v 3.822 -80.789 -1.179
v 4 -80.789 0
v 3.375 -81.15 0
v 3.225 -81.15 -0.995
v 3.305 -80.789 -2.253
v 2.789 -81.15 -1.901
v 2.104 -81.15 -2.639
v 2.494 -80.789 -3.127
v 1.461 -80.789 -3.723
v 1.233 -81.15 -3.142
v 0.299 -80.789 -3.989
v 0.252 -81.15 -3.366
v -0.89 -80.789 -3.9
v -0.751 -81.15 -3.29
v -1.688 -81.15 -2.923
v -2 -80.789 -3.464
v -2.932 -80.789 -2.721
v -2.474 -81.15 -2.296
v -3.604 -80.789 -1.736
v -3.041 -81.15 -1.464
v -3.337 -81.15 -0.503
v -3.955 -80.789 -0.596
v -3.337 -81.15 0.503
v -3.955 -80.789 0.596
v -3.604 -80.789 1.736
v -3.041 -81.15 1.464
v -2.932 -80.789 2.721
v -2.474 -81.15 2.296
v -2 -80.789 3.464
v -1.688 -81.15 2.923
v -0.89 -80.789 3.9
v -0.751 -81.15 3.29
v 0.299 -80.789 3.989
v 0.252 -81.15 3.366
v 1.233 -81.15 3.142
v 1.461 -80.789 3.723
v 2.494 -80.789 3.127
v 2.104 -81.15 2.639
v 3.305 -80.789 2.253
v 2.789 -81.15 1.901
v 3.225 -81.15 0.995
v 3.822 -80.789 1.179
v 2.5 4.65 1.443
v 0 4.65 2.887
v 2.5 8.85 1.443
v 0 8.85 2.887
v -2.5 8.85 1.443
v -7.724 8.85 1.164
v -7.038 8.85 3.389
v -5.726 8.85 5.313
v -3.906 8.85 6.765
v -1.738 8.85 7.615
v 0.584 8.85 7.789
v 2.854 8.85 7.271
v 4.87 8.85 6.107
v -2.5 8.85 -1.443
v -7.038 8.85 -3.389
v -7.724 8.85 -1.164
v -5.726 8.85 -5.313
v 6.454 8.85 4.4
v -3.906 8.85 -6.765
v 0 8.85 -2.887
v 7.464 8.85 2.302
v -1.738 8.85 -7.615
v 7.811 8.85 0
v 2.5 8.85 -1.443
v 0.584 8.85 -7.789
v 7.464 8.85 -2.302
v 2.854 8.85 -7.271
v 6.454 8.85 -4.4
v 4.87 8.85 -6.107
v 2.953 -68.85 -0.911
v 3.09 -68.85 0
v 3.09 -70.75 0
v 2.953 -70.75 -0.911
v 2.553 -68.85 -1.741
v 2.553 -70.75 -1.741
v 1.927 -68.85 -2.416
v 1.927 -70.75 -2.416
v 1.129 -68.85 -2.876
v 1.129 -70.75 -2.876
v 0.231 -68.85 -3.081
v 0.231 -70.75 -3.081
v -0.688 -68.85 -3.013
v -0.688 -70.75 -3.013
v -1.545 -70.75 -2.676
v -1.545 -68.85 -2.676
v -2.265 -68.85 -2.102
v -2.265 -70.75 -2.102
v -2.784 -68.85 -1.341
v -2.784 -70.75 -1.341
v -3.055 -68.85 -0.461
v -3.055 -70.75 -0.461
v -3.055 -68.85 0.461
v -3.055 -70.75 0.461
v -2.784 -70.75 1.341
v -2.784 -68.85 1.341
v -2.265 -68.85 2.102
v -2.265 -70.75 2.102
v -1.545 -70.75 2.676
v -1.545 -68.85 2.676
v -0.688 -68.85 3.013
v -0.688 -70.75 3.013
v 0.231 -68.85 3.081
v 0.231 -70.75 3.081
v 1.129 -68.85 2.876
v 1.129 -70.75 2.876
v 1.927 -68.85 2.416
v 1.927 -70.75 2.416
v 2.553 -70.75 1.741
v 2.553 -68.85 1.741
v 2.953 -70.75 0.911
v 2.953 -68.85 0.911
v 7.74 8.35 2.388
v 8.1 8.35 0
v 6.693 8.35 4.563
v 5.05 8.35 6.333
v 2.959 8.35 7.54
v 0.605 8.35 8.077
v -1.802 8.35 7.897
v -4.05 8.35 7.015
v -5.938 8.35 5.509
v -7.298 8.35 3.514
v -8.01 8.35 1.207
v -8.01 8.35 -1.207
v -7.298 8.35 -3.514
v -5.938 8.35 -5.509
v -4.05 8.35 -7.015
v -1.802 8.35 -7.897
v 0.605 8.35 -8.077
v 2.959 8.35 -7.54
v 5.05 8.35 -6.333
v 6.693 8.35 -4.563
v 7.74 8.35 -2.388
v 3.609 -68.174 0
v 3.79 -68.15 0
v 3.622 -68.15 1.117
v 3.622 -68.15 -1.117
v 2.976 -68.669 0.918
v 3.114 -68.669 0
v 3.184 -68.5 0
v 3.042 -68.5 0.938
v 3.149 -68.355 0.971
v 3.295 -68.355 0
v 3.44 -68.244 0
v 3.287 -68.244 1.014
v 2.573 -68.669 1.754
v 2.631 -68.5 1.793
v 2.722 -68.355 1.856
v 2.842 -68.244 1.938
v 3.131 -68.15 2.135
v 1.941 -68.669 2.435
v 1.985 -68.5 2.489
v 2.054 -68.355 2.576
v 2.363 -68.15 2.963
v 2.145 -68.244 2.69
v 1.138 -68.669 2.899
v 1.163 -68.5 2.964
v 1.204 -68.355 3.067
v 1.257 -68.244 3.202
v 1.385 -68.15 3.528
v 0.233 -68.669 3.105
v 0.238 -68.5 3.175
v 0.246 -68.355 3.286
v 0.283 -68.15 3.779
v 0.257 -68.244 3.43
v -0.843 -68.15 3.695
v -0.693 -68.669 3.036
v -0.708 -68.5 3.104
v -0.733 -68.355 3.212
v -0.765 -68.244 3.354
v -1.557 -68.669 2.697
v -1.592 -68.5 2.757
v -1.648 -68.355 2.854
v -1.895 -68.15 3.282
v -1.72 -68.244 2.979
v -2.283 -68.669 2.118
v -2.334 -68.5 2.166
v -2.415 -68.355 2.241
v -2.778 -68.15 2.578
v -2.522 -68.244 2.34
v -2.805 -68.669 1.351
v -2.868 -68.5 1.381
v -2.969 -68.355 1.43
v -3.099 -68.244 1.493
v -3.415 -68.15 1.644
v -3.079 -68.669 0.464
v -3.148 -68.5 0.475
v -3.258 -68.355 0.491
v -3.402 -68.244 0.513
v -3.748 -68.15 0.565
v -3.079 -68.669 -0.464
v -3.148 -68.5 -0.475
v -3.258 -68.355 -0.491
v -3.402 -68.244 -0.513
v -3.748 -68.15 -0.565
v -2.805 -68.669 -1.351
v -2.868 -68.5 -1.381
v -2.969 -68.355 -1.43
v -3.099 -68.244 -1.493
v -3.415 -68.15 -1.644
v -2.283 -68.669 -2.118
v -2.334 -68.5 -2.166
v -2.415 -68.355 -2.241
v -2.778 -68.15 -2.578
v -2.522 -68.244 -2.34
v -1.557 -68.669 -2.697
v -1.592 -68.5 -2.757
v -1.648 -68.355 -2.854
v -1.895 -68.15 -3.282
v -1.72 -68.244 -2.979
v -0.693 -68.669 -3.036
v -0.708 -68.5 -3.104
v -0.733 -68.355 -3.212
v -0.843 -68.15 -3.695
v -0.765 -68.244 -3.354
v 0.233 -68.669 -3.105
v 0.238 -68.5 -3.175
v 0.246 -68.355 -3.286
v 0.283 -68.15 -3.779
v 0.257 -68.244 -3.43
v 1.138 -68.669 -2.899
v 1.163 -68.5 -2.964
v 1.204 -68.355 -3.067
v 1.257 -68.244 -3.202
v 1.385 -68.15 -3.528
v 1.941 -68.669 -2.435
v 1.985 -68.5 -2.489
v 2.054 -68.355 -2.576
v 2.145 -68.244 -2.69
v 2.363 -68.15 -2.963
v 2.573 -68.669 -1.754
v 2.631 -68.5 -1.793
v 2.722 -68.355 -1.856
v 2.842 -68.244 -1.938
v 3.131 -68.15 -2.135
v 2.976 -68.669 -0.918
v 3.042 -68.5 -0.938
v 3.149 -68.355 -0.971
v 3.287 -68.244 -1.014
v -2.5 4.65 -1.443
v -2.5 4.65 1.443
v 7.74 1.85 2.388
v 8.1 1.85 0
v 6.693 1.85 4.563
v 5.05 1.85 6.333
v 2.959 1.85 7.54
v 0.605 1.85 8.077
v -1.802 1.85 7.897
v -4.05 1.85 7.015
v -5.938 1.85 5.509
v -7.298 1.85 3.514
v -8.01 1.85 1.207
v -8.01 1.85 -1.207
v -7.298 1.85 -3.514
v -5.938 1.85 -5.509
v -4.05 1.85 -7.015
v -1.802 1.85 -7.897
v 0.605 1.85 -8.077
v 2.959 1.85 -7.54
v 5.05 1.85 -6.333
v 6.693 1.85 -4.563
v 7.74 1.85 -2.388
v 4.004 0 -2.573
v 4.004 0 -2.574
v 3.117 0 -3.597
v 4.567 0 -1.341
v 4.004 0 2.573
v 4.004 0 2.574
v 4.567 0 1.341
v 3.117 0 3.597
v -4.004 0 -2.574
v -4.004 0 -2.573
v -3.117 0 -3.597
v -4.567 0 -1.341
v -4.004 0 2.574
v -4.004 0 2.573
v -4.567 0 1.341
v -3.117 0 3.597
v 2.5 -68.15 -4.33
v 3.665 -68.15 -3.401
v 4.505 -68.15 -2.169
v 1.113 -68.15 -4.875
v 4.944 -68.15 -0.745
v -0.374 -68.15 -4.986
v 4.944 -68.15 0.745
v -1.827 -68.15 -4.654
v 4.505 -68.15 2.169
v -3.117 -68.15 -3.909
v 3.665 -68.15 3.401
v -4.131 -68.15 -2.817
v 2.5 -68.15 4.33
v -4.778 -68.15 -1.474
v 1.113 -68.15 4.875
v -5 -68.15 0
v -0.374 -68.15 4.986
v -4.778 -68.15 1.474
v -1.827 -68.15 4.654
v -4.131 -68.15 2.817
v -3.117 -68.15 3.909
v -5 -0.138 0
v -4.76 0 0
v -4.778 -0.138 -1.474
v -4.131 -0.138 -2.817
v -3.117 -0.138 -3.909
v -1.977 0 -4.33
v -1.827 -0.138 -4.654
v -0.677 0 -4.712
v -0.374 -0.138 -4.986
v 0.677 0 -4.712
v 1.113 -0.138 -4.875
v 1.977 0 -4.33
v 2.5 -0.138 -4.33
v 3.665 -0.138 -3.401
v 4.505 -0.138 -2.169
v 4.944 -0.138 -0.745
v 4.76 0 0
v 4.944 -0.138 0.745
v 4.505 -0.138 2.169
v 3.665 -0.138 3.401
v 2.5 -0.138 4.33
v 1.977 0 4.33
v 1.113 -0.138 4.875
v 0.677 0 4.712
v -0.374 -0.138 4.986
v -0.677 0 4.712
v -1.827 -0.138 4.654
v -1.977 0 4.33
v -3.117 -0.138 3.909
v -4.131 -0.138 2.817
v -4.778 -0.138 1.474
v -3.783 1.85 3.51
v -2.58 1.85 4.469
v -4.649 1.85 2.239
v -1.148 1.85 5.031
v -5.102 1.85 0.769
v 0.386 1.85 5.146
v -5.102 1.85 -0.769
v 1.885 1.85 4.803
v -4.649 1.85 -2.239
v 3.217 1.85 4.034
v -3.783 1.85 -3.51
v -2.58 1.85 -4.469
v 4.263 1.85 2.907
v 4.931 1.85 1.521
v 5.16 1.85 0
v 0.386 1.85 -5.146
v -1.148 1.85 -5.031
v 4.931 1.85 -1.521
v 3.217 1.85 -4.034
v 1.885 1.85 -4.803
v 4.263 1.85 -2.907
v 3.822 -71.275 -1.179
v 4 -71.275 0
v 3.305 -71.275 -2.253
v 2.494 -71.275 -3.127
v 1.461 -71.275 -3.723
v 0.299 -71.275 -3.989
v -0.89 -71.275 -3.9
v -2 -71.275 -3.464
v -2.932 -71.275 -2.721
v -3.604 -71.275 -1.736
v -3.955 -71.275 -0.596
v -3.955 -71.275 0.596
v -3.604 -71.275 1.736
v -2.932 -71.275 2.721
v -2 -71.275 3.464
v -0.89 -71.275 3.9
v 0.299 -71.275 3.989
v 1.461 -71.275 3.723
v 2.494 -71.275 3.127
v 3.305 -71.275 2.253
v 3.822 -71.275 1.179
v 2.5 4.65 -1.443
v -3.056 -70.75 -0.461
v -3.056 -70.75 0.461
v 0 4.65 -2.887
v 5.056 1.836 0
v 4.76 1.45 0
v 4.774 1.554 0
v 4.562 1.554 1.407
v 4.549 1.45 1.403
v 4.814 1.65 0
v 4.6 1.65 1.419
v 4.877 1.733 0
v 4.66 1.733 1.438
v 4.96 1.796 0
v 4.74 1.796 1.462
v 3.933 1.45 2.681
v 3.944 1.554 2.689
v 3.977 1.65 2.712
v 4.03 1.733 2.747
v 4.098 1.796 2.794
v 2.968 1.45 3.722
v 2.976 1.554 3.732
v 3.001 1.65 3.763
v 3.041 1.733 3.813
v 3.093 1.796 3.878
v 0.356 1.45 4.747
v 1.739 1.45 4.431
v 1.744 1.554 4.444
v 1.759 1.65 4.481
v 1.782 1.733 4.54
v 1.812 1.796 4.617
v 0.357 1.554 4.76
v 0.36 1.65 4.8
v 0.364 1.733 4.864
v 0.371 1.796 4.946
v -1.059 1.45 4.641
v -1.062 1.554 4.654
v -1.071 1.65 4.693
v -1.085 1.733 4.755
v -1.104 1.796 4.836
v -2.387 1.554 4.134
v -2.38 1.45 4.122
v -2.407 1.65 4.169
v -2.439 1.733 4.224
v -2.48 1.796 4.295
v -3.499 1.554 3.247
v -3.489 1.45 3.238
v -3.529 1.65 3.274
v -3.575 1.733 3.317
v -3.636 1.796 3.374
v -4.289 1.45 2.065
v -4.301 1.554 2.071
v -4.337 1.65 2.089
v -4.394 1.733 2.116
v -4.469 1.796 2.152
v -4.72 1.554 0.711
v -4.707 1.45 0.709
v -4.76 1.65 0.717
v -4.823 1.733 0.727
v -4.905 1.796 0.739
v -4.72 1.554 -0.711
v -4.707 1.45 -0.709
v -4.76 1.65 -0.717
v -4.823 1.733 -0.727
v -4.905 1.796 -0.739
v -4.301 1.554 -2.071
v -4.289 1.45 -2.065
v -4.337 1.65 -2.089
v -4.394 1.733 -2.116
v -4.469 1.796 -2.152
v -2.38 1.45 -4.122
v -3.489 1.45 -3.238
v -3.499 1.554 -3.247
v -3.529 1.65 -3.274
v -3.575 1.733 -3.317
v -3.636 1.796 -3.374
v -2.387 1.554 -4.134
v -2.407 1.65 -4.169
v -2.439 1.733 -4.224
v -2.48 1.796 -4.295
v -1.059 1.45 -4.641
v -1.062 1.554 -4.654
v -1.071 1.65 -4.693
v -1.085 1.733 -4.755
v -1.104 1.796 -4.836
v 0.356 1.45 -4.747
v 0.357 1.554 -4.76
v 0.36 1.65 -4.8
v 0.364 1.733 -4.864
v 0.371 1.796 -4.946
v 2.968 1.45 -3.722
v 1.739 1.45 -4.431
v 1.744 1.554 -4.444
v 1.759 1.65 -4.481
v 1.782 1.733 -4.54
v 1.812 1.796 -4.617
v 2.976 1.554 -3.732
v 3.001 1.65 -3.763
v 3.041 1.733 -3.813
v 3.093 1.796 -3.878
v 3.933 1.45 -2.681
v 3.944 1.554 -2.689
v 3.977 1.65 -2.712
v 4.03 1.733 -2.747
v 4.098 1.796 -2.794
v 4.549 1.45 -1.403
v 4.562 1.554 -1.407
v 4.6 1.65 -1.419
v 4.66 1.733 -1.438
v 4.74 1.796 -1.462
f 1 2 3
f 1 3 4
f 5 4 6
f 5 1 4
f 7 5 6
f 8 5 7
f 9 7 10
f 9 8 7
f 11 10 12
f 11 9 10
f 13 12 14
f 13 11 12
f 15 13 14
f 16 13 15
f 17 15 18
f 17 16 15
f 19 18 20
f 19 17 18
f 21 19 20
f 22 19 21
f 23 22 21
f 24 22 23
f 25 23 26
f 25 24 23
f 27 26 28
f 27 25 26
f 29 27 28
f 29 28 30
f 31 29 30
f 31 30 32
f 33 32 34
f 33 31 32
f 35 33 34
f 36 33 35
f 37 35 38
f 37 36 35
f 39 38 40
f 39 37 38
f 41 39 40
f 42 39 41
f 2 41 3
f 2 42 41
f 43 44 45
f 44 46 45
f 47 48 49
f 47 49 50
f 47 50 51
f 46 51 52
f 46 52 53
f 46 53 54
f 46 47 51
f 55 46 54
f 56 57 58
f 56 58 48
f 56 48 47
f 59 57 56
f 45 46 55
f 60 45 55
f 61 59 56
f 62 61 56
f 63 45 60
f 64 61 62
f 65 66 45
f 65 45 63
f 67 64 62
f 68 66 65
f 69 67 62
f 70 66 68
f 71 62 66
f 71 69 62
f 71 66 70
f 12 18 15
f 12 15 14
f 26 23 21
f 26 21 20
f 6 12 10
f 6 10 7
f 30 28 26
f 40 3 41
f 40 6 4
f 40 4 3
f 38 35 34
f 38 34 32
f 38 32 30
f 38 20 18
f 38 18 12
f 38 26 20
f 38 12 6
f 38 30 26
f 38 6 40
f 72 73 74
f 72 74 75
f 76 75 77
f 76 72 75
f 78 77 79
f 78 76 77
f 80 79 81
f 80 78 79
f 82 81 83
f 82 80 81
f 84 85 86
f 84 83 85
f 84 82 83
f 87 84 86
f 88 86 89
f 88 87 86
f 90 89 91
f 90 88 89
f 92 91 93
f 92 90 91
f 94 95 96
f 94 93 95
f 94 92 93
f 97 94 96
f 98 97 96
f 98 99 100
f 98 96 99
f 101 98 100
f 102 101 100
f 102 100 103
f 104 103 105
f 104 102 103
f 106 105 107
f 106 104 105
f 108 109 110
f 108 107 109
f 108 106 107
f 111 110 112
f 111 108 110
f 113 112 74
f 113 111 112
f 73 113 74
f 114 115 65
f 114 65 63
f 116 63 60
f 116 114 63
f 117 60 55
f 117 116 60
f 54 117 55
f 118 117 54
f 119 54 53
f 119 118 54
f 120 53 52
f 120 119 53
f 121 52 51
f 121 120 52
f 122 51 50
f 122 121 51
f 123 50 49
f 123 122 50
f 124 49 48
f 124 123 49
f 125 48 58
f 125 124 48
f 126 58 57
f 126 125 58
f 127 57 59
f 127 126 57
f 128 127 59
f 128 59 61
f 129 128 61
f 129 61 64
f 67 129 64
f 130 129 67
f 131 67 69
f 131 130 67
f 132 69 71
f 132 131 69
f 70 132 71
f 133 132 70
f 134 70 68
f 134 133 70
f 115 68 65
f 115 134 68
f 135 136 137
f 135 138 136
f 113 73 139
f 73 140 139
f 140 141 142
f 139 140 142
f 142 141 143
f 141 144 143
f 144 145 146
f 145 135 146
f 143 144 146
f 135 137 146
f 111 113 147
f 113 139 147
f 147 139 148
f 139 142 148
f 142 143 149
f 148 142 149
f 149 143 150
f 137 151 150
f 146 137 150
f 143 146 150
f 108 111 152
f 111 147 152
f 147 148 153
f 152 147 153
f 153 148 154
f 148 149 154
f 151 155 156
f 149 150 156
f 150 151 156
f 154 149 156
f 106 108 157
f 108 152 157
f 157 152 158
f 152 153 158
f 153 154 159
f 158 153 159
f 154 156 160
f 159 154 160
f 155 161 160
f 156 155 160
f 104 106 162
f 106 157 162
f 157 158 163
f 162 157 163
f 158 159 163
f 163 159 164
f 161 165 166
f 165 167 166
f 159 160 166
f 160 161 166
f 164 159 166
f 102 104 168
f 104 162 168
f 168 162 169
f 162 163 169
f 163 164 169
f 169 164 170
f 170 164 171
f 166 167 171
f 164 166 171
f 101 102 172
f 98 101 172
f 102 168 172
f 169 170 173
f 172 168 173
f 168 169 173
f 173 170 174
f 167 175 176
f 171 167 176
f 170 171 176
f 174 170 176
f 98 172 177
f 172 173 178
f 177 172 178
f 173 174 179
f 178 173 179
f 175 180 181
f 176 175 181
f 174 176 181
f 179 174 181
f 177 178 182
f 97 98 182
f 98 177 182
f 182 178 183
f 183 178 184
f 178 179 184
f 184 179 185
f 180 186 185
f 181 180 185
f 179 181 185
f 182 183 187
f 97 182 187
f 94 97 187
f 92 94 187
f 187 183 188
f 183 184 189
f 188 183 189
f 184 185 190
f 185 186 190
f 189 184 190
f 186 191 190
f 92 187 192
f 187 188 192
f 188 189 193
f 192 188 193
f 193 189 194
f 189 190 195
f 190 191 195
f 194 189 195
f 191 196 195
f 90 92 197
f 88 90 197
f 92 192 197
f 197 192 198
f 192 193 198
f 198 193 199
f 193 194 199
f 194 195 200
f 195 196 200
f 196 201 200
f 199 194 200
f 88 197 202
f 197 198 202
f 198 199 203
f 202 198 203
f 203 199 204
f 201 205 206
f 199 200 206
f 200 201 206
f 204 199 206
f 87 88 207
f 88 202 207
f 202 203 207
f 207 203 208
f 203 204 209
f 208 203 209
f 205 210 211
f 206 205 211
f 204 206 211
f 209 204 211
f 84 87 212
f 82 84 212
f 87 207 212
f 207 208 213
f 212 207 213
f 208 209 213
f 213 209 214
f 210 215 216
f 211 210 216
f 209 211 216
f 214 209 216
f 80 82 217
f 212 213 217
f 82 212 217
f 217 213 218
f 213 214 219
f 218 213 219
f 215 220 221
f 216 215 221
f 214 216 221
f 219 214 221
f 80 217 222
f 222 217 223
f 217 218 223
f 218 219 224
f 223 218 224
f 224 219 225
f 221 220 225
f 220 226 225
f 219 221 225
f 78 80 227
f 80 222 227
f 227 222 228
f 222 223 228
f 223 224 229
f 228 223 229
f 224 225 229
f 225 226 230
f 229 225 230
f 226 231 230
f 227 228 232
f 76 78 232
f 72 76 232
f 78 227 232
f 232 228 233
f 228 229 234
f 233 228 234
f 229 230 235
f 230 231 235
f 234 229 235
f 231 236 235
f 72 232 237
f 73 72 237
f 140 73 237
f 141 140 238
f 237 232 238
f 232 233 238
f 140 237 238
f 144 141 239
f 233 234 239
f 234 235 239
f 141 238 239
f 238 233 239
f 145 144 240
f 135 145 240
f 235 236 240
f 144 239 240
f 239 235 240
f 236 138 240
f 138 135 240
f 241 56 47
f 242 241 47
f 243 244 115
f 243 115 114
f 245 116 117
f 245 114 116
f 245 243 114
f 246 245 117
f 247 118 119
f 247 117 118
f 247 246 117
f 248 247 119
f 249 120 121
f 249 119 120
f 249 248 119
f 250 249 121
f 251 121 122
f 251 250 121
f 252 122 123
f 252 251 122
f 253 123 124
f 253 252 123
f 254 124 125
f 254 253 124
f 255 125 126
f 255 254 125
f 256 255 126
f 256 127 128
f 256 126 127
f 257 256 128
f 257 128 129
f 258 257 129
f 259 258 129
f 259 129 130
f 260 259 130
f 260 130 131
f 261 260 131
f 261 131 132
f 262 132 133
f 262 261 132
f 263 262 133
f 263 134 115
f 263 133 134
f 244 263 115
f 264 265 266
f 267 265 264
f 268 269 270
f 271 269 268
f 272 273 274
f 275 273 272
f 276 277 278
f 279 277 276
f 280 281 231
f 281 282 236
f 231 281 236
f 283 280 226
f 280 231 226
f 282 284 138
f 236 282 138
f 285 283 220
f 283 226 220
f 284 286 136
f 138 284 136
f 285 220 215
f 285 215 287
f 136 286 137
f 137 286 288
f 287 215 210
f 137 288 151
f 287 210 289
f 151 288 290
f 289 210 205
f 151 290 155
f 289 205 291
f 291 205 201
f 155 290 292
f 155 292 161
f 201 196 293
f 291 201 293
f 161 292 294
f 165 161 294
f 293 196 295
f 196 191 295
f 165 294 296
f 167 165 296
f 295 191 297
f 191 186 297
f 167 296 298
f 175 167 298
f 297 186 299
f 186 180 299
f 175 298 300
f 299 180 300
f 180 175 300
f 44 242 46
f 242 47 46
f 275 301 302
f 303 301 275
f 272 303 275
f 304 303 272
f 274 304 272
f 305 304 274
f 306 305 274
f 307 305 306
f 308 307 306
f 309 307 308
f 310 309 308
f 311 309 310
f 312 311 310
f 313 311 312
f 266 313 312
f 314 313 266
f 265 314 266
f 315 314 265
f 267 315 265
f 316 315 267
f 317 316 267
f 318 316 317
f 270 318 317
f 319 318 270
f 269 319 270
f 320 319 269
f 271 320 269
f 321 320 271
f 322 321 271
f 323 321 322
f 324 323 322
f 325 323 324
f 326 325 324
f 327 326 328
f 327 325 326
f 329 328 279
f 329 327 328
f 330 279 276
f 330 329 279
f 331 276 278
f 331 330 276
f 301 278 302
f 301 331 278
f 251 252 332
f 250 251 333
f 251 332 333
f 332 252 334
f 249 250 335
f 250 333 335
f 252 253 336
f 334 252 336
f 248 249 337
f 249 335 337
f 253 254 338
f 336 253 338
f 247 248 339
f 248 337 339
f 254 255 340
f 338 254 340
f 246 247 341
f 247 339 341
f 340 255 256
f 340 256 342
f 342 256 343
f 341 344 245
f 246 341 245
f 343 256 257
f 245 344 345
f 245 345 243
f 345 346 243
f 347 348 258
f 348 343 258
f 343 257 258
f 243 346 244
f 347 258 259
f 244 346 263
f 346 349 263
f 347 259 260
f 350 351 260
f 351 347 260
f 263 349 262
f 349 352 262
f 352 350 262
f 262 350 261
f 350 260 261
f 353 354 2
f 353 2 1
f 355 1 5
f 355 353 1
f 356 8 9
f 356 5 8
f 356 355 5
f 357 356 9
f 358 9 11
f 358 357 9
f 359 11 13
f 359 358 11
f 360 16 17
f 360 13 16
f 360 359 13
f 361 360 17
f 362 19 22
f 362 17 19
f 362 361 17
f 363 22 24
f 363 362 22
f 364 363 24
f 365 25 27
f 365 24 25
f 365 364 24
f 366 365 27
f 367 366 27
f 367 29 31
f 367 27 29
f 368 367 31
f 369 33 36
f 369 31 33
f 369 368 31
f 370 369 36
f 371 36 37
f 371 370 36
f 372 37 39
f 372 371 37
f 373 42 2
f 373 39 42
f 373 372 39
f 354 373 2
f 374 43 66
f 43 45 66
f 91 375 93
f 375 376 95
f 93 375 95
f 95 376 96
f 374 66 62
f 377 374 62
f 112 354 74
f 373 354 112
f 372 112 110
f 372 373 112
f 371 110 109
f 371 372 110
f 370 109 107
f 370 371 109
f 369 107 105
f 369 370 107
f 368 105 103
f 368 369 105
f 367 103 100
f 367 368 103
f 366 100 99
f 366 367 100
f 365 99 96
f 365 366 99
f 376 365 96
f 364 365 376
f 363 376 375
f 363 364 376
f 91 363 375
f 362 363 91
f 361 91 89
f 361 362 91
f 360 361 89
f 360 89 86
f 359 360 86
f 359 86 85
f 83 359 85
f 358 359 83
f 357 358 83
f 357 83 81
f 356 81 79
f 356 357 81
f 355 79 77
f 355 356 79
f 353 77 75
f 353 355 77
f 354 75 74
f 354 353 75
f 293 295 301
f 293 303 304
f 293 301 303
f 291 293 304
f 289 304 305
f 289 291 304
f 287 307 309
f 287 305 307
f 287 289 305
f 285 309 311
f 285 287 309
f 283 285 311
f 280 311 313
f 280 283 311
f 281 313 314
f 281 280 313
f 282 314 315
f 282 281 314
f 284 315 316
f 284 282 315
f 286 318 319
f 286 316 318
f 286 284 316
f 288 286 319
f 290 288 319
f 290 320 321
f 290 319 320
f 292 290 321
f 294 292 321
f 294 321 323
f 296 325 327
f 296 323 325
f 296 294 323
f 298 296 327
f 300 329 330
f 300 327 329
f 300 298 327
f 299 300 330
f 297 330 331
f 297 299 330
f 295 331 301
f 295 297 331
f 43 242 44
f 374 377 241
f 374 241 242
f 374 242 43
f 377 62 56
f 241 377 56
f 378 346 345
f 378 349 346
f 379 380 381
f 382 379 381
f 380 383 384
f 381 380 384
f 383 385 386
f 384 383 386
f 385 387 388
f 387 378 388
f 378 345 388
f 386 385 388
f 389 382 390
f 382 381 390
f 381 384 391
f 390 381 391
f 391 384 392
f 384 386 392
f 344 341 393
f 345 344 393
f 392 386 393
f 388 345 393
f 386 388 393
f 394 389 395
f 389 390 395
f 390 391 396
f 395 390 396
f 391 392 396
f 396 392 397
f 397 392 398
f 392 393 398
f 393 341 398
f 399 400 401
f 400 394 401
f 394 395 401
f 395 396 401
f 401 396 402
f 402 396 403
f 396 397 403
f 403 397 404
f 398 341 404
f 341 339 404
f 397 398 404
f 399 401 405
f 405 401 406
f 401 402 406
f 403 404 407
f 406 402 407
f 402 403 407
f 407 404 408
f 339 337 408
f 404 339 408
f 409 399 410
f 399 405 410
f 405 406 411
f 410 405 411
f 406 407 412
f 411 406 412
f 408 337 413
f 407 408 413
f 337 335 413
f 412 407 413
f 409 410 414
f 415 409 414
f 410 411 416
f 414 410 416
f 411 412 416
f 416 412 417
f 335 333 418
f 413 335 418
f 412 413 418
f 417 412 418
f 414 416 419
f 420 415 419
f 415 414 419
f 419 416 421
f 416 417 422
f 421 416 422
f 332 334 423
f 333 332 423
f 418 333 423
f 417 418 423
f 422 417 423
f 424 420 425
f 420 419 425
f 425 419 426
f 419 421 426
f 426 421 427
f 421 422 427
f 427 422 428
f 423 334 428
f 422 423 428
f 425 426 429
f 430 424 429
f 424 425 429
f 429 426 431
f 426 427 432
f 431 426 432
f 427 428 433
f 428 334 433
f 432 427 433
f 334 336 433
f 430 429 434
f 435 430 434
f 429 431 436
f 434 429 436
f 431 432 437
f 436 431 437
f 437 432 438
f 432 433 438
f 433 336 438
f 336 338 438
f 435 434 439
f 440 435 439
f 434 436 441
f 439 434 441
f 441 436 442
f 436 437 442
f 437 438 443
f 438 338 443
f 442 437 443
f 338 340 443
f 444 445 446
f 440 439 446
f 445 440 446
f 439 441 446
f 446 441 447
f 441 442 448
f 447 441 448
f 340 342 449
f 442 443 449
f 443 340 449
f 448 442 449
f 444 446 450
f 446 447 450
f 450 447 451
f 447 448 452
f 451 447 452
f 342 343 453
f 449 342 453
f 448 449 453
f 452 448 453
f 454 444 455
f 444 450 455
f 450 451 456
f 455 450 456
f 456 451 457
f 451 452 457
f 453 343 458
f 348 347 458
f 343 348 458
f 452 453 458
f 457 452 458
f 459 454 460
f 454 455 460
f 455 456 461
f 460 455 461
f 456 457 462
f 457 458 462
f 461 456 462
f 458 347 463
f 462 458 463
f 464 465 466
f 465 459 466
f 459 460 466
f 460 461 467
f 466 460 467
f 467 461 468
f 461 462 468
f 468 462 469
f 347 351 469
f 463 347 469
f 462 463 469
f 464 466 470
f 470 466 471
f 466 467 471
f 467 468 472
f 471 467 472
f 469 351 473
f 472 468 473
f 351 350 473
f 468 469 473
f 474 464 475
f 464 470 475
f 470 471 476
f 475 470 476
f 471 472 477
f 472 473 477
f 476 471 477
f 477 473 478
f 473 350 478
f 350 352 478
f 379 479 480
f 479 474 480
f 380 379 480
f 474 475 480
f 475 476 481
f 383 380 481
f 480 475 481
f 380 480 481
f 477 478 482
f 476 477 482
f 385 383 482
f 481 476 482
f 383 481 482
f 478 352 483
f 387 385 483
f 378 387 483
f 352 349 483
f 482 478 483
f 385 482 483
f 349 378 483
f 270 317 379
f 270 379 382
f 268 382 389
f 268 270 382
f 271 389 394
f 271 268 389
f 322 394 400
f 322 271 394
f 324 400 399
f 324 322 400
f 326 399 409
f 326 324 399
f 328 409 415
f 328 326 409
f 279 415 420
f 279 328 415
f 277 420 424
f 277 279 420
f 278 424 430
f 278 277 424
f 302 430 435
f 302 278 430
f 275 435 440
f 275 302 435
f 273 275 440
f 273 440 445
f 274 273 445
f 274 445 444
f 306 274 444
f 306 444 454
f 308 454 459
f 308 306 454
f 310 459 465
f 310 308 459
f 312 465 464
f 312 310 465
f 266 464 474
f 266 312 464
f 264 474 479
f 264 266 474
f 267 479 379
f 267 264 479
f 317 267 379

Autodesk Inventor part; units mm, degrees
ref_plane "YZ Plane" through (0, 0, 0) normal (1, 0, 0) x (0, 1, 0)
ref_plane "XZ Plane" through (0, 0, 0) normal (0, 1, 0) x (-1, 0, 0)
ref_plane "XY Plane" through (0, 0, 0) normal (0, 0, 1) x (1, 0, 0)
sketch "Sketch1" plane through (0, 0, 0) normal (0, 0, 1) x (1, 0, 0)
  line L0 (0, 0) -> (-5, 0)
  line L1 (-5, 0) -> (-5, -68.15)
  line L2 (-5, -68.15) -> (0, -68.15)
  line L3 (0, -68.15) -> (0, 0)
  line L4 (0, 13.63) -> (0, -81.78) projected
  line L5 (-6, 0) -> (1, 0) projected
  dimension "d1" = 68.15
  dimension "d2" = 5
revolve "Shoulder" add sketch "Sketch1" angle 360 about axis through (0, -68.15, 0) along (0, 1, 0)
sketch "Sketch2" plane through (0, 0, 0) normal (0, 1, 0) x (1, 0, 0)
  circle A0 centre (0, 0) radius 5 projected
  circle A1 centre (0, 0) radius 4.76
  dimension "d3" = 9.52
extrude "Shoulder_neck" add sketch "Sketch2" along normal blind 1.85 contours A1
sketch "Sketch3" plane through (0, 1.85, 0) normal (0, 1, 0) x (1, 0, 0)
  circle A0 centre (0, 0) radius 4.76 projected
  circle A1 centre (0, 0) radius 8.1
  dimension "d6" = 16.2
extrude "Head" add sketch "Sketch3" along normal blind 7 contours A0 | A1
sketch "Sketch4" plane through (0, -68.15, 0) normal (0, -1, 0) x (1, 0, 0)
  circle A0 centre (0, 0) radius 5 projected
  circle A1 centre (0, 0) radius 3.09
  dimension "d9" = 6.18
extrude "Thread_neck" add sketch "Sketch4" along normal blind 2.6 contours A1
sketch "Sketch5" plane through (0, -70.75, 0) normal (0, -1, 0) x (1, 0, 0)
  circle A0 centre (0, 0) radius 3.09 projected
  circle A1 centre (0, 0) radius 4
  dimension "d12" = 8
extrude "Thread_shoulder" add sketch "Sketch5" along normal blind 10.4 contours A0 | A1
sketch "Sketch6" plane through (0, 8.85, 0) normal (0, 1, 0) x (1, 0, 0)
  circle A0 centre (0, 0) radius 8.1 projected
  circle A1 centre (0, 0) radius 2.5 construction
  line L0 (-2.5, 1.4434) -> (-2.5, -1.4434)
  line L1 (-2.5, -1.4434) -> (0, -2.8868)
  line L2 (0, -2.8868) -> (2.5, -1.4434)
  line L3 (2.5, -1.4434) -> (2.5, 1.4434)
  line L4 (2.5, 1.4434) -> (0, 2.8868)
  line L5 (0, 2.8868) -> (-2.5, 1.4434)
  dimension "d15" = 5
extrude "Hex" cut sketch "Sketch6" against normal blind 4.2 contours L5 L4 L3 L2 L1 L0
chamfer "Chamfer1" distance 0.24 angle 30 1 edges at (5, 0, 0) measured on face at (-4.8255, 0, -0.7786)
fillet "Fillet1" radius 0.4 1 edges at (-4.76, 1.85, 0)
chamfer "Chamfer2" distance 0.5 angle 30 1 edges at (-8.1, 8.85, 0) measured on face at (7.9951, 6.5167, 1.2993)
chamfer "Chamfer3" distance 0.625 angle 30 1 edges at (-4, -81.15, 0) measured on face at (0.7574, -81.15, 1.0973)
fillet "Fillet2" radius 0.7 1 edges at (-3.09, -68.15, 0)
chamfer "Chamfer7" distance 0.91 angle 30 1 edges at (-4, -70.75, 0) measured on face at (3.6579, -70.75, -0.3191)
thread "Thread" size "M8x1.25" class "6g" standard "ANSI Metric M Profile" full length
equation "\"d3\" = Shoulder_neck_dia"
equation "\"d4\" = Shoulder_neck_length"
equation "\"d6\" = Head_diameter"
equation "\"d7\" = Head_height"
equation "\"d9\" = Thread_neck_dia"
equation "\"d10\" = Thread_neck_length"
equation "\"d12\" = Thread_diameter"
equation "\"d13\" = Thread_length - Thread_neck_length"
equation "\"d15\" = Hex_size"
equation "\"d16\" = Hex_length"
equation "\"d18\" = -0.5 * Shoulder_neck_dia + 0.5 * Shoulder_diameter"
equation "\"d64\" = -0.5 * Shoulder_neck_dia + 0.5 * Shoulder_diameter"
equation "\"d21\" = 0.1 * Hex_size"
equation "\"d65\" = 0.1 * Hex_size"
equation "\"d23\" = 0.5 * Thread_pitch"
equation "\"d66\" = 0.5 * Thread_pitch"
equation "\"d25\" = Thread_neck_radius"
equation "\"d60\" = -0.5 * Thread_neck_dia + 0.5 * Thread_diameter"
equation "\"d67\" = -0.5 * Thread_neck_dia + 0.5 * Thread_diameter"
equation "\"Shoulder_neck_dia\" = 9.52"
equation "\"Thread_diameter\" = 8"
equation "\"Thread_length\" = 13"
equation "\"Head_diameter\" = 16.2"
equation "\"Head_height\" = 7"
equation "\"Thread_neck_dia\" = 6.18"
equation "\"Hex_size\" = 5"
equation "\"Hex_length\" = 4.2"
equation "\"Thread_pitch\" = 1.25"
equation "\"Shoulder_neck_length\" = 1.85"
equation "\"Thread_neck_length\" = 2.6"
equation "\"Thread_neck_radius\" = 0.7"
equation "\"Shoulder_diameter\" = 10"
properties part number "SCREW, SHOULDER, P, 12.9, 10MMX70MM" material "Steel, High Strength Low Alloy"
